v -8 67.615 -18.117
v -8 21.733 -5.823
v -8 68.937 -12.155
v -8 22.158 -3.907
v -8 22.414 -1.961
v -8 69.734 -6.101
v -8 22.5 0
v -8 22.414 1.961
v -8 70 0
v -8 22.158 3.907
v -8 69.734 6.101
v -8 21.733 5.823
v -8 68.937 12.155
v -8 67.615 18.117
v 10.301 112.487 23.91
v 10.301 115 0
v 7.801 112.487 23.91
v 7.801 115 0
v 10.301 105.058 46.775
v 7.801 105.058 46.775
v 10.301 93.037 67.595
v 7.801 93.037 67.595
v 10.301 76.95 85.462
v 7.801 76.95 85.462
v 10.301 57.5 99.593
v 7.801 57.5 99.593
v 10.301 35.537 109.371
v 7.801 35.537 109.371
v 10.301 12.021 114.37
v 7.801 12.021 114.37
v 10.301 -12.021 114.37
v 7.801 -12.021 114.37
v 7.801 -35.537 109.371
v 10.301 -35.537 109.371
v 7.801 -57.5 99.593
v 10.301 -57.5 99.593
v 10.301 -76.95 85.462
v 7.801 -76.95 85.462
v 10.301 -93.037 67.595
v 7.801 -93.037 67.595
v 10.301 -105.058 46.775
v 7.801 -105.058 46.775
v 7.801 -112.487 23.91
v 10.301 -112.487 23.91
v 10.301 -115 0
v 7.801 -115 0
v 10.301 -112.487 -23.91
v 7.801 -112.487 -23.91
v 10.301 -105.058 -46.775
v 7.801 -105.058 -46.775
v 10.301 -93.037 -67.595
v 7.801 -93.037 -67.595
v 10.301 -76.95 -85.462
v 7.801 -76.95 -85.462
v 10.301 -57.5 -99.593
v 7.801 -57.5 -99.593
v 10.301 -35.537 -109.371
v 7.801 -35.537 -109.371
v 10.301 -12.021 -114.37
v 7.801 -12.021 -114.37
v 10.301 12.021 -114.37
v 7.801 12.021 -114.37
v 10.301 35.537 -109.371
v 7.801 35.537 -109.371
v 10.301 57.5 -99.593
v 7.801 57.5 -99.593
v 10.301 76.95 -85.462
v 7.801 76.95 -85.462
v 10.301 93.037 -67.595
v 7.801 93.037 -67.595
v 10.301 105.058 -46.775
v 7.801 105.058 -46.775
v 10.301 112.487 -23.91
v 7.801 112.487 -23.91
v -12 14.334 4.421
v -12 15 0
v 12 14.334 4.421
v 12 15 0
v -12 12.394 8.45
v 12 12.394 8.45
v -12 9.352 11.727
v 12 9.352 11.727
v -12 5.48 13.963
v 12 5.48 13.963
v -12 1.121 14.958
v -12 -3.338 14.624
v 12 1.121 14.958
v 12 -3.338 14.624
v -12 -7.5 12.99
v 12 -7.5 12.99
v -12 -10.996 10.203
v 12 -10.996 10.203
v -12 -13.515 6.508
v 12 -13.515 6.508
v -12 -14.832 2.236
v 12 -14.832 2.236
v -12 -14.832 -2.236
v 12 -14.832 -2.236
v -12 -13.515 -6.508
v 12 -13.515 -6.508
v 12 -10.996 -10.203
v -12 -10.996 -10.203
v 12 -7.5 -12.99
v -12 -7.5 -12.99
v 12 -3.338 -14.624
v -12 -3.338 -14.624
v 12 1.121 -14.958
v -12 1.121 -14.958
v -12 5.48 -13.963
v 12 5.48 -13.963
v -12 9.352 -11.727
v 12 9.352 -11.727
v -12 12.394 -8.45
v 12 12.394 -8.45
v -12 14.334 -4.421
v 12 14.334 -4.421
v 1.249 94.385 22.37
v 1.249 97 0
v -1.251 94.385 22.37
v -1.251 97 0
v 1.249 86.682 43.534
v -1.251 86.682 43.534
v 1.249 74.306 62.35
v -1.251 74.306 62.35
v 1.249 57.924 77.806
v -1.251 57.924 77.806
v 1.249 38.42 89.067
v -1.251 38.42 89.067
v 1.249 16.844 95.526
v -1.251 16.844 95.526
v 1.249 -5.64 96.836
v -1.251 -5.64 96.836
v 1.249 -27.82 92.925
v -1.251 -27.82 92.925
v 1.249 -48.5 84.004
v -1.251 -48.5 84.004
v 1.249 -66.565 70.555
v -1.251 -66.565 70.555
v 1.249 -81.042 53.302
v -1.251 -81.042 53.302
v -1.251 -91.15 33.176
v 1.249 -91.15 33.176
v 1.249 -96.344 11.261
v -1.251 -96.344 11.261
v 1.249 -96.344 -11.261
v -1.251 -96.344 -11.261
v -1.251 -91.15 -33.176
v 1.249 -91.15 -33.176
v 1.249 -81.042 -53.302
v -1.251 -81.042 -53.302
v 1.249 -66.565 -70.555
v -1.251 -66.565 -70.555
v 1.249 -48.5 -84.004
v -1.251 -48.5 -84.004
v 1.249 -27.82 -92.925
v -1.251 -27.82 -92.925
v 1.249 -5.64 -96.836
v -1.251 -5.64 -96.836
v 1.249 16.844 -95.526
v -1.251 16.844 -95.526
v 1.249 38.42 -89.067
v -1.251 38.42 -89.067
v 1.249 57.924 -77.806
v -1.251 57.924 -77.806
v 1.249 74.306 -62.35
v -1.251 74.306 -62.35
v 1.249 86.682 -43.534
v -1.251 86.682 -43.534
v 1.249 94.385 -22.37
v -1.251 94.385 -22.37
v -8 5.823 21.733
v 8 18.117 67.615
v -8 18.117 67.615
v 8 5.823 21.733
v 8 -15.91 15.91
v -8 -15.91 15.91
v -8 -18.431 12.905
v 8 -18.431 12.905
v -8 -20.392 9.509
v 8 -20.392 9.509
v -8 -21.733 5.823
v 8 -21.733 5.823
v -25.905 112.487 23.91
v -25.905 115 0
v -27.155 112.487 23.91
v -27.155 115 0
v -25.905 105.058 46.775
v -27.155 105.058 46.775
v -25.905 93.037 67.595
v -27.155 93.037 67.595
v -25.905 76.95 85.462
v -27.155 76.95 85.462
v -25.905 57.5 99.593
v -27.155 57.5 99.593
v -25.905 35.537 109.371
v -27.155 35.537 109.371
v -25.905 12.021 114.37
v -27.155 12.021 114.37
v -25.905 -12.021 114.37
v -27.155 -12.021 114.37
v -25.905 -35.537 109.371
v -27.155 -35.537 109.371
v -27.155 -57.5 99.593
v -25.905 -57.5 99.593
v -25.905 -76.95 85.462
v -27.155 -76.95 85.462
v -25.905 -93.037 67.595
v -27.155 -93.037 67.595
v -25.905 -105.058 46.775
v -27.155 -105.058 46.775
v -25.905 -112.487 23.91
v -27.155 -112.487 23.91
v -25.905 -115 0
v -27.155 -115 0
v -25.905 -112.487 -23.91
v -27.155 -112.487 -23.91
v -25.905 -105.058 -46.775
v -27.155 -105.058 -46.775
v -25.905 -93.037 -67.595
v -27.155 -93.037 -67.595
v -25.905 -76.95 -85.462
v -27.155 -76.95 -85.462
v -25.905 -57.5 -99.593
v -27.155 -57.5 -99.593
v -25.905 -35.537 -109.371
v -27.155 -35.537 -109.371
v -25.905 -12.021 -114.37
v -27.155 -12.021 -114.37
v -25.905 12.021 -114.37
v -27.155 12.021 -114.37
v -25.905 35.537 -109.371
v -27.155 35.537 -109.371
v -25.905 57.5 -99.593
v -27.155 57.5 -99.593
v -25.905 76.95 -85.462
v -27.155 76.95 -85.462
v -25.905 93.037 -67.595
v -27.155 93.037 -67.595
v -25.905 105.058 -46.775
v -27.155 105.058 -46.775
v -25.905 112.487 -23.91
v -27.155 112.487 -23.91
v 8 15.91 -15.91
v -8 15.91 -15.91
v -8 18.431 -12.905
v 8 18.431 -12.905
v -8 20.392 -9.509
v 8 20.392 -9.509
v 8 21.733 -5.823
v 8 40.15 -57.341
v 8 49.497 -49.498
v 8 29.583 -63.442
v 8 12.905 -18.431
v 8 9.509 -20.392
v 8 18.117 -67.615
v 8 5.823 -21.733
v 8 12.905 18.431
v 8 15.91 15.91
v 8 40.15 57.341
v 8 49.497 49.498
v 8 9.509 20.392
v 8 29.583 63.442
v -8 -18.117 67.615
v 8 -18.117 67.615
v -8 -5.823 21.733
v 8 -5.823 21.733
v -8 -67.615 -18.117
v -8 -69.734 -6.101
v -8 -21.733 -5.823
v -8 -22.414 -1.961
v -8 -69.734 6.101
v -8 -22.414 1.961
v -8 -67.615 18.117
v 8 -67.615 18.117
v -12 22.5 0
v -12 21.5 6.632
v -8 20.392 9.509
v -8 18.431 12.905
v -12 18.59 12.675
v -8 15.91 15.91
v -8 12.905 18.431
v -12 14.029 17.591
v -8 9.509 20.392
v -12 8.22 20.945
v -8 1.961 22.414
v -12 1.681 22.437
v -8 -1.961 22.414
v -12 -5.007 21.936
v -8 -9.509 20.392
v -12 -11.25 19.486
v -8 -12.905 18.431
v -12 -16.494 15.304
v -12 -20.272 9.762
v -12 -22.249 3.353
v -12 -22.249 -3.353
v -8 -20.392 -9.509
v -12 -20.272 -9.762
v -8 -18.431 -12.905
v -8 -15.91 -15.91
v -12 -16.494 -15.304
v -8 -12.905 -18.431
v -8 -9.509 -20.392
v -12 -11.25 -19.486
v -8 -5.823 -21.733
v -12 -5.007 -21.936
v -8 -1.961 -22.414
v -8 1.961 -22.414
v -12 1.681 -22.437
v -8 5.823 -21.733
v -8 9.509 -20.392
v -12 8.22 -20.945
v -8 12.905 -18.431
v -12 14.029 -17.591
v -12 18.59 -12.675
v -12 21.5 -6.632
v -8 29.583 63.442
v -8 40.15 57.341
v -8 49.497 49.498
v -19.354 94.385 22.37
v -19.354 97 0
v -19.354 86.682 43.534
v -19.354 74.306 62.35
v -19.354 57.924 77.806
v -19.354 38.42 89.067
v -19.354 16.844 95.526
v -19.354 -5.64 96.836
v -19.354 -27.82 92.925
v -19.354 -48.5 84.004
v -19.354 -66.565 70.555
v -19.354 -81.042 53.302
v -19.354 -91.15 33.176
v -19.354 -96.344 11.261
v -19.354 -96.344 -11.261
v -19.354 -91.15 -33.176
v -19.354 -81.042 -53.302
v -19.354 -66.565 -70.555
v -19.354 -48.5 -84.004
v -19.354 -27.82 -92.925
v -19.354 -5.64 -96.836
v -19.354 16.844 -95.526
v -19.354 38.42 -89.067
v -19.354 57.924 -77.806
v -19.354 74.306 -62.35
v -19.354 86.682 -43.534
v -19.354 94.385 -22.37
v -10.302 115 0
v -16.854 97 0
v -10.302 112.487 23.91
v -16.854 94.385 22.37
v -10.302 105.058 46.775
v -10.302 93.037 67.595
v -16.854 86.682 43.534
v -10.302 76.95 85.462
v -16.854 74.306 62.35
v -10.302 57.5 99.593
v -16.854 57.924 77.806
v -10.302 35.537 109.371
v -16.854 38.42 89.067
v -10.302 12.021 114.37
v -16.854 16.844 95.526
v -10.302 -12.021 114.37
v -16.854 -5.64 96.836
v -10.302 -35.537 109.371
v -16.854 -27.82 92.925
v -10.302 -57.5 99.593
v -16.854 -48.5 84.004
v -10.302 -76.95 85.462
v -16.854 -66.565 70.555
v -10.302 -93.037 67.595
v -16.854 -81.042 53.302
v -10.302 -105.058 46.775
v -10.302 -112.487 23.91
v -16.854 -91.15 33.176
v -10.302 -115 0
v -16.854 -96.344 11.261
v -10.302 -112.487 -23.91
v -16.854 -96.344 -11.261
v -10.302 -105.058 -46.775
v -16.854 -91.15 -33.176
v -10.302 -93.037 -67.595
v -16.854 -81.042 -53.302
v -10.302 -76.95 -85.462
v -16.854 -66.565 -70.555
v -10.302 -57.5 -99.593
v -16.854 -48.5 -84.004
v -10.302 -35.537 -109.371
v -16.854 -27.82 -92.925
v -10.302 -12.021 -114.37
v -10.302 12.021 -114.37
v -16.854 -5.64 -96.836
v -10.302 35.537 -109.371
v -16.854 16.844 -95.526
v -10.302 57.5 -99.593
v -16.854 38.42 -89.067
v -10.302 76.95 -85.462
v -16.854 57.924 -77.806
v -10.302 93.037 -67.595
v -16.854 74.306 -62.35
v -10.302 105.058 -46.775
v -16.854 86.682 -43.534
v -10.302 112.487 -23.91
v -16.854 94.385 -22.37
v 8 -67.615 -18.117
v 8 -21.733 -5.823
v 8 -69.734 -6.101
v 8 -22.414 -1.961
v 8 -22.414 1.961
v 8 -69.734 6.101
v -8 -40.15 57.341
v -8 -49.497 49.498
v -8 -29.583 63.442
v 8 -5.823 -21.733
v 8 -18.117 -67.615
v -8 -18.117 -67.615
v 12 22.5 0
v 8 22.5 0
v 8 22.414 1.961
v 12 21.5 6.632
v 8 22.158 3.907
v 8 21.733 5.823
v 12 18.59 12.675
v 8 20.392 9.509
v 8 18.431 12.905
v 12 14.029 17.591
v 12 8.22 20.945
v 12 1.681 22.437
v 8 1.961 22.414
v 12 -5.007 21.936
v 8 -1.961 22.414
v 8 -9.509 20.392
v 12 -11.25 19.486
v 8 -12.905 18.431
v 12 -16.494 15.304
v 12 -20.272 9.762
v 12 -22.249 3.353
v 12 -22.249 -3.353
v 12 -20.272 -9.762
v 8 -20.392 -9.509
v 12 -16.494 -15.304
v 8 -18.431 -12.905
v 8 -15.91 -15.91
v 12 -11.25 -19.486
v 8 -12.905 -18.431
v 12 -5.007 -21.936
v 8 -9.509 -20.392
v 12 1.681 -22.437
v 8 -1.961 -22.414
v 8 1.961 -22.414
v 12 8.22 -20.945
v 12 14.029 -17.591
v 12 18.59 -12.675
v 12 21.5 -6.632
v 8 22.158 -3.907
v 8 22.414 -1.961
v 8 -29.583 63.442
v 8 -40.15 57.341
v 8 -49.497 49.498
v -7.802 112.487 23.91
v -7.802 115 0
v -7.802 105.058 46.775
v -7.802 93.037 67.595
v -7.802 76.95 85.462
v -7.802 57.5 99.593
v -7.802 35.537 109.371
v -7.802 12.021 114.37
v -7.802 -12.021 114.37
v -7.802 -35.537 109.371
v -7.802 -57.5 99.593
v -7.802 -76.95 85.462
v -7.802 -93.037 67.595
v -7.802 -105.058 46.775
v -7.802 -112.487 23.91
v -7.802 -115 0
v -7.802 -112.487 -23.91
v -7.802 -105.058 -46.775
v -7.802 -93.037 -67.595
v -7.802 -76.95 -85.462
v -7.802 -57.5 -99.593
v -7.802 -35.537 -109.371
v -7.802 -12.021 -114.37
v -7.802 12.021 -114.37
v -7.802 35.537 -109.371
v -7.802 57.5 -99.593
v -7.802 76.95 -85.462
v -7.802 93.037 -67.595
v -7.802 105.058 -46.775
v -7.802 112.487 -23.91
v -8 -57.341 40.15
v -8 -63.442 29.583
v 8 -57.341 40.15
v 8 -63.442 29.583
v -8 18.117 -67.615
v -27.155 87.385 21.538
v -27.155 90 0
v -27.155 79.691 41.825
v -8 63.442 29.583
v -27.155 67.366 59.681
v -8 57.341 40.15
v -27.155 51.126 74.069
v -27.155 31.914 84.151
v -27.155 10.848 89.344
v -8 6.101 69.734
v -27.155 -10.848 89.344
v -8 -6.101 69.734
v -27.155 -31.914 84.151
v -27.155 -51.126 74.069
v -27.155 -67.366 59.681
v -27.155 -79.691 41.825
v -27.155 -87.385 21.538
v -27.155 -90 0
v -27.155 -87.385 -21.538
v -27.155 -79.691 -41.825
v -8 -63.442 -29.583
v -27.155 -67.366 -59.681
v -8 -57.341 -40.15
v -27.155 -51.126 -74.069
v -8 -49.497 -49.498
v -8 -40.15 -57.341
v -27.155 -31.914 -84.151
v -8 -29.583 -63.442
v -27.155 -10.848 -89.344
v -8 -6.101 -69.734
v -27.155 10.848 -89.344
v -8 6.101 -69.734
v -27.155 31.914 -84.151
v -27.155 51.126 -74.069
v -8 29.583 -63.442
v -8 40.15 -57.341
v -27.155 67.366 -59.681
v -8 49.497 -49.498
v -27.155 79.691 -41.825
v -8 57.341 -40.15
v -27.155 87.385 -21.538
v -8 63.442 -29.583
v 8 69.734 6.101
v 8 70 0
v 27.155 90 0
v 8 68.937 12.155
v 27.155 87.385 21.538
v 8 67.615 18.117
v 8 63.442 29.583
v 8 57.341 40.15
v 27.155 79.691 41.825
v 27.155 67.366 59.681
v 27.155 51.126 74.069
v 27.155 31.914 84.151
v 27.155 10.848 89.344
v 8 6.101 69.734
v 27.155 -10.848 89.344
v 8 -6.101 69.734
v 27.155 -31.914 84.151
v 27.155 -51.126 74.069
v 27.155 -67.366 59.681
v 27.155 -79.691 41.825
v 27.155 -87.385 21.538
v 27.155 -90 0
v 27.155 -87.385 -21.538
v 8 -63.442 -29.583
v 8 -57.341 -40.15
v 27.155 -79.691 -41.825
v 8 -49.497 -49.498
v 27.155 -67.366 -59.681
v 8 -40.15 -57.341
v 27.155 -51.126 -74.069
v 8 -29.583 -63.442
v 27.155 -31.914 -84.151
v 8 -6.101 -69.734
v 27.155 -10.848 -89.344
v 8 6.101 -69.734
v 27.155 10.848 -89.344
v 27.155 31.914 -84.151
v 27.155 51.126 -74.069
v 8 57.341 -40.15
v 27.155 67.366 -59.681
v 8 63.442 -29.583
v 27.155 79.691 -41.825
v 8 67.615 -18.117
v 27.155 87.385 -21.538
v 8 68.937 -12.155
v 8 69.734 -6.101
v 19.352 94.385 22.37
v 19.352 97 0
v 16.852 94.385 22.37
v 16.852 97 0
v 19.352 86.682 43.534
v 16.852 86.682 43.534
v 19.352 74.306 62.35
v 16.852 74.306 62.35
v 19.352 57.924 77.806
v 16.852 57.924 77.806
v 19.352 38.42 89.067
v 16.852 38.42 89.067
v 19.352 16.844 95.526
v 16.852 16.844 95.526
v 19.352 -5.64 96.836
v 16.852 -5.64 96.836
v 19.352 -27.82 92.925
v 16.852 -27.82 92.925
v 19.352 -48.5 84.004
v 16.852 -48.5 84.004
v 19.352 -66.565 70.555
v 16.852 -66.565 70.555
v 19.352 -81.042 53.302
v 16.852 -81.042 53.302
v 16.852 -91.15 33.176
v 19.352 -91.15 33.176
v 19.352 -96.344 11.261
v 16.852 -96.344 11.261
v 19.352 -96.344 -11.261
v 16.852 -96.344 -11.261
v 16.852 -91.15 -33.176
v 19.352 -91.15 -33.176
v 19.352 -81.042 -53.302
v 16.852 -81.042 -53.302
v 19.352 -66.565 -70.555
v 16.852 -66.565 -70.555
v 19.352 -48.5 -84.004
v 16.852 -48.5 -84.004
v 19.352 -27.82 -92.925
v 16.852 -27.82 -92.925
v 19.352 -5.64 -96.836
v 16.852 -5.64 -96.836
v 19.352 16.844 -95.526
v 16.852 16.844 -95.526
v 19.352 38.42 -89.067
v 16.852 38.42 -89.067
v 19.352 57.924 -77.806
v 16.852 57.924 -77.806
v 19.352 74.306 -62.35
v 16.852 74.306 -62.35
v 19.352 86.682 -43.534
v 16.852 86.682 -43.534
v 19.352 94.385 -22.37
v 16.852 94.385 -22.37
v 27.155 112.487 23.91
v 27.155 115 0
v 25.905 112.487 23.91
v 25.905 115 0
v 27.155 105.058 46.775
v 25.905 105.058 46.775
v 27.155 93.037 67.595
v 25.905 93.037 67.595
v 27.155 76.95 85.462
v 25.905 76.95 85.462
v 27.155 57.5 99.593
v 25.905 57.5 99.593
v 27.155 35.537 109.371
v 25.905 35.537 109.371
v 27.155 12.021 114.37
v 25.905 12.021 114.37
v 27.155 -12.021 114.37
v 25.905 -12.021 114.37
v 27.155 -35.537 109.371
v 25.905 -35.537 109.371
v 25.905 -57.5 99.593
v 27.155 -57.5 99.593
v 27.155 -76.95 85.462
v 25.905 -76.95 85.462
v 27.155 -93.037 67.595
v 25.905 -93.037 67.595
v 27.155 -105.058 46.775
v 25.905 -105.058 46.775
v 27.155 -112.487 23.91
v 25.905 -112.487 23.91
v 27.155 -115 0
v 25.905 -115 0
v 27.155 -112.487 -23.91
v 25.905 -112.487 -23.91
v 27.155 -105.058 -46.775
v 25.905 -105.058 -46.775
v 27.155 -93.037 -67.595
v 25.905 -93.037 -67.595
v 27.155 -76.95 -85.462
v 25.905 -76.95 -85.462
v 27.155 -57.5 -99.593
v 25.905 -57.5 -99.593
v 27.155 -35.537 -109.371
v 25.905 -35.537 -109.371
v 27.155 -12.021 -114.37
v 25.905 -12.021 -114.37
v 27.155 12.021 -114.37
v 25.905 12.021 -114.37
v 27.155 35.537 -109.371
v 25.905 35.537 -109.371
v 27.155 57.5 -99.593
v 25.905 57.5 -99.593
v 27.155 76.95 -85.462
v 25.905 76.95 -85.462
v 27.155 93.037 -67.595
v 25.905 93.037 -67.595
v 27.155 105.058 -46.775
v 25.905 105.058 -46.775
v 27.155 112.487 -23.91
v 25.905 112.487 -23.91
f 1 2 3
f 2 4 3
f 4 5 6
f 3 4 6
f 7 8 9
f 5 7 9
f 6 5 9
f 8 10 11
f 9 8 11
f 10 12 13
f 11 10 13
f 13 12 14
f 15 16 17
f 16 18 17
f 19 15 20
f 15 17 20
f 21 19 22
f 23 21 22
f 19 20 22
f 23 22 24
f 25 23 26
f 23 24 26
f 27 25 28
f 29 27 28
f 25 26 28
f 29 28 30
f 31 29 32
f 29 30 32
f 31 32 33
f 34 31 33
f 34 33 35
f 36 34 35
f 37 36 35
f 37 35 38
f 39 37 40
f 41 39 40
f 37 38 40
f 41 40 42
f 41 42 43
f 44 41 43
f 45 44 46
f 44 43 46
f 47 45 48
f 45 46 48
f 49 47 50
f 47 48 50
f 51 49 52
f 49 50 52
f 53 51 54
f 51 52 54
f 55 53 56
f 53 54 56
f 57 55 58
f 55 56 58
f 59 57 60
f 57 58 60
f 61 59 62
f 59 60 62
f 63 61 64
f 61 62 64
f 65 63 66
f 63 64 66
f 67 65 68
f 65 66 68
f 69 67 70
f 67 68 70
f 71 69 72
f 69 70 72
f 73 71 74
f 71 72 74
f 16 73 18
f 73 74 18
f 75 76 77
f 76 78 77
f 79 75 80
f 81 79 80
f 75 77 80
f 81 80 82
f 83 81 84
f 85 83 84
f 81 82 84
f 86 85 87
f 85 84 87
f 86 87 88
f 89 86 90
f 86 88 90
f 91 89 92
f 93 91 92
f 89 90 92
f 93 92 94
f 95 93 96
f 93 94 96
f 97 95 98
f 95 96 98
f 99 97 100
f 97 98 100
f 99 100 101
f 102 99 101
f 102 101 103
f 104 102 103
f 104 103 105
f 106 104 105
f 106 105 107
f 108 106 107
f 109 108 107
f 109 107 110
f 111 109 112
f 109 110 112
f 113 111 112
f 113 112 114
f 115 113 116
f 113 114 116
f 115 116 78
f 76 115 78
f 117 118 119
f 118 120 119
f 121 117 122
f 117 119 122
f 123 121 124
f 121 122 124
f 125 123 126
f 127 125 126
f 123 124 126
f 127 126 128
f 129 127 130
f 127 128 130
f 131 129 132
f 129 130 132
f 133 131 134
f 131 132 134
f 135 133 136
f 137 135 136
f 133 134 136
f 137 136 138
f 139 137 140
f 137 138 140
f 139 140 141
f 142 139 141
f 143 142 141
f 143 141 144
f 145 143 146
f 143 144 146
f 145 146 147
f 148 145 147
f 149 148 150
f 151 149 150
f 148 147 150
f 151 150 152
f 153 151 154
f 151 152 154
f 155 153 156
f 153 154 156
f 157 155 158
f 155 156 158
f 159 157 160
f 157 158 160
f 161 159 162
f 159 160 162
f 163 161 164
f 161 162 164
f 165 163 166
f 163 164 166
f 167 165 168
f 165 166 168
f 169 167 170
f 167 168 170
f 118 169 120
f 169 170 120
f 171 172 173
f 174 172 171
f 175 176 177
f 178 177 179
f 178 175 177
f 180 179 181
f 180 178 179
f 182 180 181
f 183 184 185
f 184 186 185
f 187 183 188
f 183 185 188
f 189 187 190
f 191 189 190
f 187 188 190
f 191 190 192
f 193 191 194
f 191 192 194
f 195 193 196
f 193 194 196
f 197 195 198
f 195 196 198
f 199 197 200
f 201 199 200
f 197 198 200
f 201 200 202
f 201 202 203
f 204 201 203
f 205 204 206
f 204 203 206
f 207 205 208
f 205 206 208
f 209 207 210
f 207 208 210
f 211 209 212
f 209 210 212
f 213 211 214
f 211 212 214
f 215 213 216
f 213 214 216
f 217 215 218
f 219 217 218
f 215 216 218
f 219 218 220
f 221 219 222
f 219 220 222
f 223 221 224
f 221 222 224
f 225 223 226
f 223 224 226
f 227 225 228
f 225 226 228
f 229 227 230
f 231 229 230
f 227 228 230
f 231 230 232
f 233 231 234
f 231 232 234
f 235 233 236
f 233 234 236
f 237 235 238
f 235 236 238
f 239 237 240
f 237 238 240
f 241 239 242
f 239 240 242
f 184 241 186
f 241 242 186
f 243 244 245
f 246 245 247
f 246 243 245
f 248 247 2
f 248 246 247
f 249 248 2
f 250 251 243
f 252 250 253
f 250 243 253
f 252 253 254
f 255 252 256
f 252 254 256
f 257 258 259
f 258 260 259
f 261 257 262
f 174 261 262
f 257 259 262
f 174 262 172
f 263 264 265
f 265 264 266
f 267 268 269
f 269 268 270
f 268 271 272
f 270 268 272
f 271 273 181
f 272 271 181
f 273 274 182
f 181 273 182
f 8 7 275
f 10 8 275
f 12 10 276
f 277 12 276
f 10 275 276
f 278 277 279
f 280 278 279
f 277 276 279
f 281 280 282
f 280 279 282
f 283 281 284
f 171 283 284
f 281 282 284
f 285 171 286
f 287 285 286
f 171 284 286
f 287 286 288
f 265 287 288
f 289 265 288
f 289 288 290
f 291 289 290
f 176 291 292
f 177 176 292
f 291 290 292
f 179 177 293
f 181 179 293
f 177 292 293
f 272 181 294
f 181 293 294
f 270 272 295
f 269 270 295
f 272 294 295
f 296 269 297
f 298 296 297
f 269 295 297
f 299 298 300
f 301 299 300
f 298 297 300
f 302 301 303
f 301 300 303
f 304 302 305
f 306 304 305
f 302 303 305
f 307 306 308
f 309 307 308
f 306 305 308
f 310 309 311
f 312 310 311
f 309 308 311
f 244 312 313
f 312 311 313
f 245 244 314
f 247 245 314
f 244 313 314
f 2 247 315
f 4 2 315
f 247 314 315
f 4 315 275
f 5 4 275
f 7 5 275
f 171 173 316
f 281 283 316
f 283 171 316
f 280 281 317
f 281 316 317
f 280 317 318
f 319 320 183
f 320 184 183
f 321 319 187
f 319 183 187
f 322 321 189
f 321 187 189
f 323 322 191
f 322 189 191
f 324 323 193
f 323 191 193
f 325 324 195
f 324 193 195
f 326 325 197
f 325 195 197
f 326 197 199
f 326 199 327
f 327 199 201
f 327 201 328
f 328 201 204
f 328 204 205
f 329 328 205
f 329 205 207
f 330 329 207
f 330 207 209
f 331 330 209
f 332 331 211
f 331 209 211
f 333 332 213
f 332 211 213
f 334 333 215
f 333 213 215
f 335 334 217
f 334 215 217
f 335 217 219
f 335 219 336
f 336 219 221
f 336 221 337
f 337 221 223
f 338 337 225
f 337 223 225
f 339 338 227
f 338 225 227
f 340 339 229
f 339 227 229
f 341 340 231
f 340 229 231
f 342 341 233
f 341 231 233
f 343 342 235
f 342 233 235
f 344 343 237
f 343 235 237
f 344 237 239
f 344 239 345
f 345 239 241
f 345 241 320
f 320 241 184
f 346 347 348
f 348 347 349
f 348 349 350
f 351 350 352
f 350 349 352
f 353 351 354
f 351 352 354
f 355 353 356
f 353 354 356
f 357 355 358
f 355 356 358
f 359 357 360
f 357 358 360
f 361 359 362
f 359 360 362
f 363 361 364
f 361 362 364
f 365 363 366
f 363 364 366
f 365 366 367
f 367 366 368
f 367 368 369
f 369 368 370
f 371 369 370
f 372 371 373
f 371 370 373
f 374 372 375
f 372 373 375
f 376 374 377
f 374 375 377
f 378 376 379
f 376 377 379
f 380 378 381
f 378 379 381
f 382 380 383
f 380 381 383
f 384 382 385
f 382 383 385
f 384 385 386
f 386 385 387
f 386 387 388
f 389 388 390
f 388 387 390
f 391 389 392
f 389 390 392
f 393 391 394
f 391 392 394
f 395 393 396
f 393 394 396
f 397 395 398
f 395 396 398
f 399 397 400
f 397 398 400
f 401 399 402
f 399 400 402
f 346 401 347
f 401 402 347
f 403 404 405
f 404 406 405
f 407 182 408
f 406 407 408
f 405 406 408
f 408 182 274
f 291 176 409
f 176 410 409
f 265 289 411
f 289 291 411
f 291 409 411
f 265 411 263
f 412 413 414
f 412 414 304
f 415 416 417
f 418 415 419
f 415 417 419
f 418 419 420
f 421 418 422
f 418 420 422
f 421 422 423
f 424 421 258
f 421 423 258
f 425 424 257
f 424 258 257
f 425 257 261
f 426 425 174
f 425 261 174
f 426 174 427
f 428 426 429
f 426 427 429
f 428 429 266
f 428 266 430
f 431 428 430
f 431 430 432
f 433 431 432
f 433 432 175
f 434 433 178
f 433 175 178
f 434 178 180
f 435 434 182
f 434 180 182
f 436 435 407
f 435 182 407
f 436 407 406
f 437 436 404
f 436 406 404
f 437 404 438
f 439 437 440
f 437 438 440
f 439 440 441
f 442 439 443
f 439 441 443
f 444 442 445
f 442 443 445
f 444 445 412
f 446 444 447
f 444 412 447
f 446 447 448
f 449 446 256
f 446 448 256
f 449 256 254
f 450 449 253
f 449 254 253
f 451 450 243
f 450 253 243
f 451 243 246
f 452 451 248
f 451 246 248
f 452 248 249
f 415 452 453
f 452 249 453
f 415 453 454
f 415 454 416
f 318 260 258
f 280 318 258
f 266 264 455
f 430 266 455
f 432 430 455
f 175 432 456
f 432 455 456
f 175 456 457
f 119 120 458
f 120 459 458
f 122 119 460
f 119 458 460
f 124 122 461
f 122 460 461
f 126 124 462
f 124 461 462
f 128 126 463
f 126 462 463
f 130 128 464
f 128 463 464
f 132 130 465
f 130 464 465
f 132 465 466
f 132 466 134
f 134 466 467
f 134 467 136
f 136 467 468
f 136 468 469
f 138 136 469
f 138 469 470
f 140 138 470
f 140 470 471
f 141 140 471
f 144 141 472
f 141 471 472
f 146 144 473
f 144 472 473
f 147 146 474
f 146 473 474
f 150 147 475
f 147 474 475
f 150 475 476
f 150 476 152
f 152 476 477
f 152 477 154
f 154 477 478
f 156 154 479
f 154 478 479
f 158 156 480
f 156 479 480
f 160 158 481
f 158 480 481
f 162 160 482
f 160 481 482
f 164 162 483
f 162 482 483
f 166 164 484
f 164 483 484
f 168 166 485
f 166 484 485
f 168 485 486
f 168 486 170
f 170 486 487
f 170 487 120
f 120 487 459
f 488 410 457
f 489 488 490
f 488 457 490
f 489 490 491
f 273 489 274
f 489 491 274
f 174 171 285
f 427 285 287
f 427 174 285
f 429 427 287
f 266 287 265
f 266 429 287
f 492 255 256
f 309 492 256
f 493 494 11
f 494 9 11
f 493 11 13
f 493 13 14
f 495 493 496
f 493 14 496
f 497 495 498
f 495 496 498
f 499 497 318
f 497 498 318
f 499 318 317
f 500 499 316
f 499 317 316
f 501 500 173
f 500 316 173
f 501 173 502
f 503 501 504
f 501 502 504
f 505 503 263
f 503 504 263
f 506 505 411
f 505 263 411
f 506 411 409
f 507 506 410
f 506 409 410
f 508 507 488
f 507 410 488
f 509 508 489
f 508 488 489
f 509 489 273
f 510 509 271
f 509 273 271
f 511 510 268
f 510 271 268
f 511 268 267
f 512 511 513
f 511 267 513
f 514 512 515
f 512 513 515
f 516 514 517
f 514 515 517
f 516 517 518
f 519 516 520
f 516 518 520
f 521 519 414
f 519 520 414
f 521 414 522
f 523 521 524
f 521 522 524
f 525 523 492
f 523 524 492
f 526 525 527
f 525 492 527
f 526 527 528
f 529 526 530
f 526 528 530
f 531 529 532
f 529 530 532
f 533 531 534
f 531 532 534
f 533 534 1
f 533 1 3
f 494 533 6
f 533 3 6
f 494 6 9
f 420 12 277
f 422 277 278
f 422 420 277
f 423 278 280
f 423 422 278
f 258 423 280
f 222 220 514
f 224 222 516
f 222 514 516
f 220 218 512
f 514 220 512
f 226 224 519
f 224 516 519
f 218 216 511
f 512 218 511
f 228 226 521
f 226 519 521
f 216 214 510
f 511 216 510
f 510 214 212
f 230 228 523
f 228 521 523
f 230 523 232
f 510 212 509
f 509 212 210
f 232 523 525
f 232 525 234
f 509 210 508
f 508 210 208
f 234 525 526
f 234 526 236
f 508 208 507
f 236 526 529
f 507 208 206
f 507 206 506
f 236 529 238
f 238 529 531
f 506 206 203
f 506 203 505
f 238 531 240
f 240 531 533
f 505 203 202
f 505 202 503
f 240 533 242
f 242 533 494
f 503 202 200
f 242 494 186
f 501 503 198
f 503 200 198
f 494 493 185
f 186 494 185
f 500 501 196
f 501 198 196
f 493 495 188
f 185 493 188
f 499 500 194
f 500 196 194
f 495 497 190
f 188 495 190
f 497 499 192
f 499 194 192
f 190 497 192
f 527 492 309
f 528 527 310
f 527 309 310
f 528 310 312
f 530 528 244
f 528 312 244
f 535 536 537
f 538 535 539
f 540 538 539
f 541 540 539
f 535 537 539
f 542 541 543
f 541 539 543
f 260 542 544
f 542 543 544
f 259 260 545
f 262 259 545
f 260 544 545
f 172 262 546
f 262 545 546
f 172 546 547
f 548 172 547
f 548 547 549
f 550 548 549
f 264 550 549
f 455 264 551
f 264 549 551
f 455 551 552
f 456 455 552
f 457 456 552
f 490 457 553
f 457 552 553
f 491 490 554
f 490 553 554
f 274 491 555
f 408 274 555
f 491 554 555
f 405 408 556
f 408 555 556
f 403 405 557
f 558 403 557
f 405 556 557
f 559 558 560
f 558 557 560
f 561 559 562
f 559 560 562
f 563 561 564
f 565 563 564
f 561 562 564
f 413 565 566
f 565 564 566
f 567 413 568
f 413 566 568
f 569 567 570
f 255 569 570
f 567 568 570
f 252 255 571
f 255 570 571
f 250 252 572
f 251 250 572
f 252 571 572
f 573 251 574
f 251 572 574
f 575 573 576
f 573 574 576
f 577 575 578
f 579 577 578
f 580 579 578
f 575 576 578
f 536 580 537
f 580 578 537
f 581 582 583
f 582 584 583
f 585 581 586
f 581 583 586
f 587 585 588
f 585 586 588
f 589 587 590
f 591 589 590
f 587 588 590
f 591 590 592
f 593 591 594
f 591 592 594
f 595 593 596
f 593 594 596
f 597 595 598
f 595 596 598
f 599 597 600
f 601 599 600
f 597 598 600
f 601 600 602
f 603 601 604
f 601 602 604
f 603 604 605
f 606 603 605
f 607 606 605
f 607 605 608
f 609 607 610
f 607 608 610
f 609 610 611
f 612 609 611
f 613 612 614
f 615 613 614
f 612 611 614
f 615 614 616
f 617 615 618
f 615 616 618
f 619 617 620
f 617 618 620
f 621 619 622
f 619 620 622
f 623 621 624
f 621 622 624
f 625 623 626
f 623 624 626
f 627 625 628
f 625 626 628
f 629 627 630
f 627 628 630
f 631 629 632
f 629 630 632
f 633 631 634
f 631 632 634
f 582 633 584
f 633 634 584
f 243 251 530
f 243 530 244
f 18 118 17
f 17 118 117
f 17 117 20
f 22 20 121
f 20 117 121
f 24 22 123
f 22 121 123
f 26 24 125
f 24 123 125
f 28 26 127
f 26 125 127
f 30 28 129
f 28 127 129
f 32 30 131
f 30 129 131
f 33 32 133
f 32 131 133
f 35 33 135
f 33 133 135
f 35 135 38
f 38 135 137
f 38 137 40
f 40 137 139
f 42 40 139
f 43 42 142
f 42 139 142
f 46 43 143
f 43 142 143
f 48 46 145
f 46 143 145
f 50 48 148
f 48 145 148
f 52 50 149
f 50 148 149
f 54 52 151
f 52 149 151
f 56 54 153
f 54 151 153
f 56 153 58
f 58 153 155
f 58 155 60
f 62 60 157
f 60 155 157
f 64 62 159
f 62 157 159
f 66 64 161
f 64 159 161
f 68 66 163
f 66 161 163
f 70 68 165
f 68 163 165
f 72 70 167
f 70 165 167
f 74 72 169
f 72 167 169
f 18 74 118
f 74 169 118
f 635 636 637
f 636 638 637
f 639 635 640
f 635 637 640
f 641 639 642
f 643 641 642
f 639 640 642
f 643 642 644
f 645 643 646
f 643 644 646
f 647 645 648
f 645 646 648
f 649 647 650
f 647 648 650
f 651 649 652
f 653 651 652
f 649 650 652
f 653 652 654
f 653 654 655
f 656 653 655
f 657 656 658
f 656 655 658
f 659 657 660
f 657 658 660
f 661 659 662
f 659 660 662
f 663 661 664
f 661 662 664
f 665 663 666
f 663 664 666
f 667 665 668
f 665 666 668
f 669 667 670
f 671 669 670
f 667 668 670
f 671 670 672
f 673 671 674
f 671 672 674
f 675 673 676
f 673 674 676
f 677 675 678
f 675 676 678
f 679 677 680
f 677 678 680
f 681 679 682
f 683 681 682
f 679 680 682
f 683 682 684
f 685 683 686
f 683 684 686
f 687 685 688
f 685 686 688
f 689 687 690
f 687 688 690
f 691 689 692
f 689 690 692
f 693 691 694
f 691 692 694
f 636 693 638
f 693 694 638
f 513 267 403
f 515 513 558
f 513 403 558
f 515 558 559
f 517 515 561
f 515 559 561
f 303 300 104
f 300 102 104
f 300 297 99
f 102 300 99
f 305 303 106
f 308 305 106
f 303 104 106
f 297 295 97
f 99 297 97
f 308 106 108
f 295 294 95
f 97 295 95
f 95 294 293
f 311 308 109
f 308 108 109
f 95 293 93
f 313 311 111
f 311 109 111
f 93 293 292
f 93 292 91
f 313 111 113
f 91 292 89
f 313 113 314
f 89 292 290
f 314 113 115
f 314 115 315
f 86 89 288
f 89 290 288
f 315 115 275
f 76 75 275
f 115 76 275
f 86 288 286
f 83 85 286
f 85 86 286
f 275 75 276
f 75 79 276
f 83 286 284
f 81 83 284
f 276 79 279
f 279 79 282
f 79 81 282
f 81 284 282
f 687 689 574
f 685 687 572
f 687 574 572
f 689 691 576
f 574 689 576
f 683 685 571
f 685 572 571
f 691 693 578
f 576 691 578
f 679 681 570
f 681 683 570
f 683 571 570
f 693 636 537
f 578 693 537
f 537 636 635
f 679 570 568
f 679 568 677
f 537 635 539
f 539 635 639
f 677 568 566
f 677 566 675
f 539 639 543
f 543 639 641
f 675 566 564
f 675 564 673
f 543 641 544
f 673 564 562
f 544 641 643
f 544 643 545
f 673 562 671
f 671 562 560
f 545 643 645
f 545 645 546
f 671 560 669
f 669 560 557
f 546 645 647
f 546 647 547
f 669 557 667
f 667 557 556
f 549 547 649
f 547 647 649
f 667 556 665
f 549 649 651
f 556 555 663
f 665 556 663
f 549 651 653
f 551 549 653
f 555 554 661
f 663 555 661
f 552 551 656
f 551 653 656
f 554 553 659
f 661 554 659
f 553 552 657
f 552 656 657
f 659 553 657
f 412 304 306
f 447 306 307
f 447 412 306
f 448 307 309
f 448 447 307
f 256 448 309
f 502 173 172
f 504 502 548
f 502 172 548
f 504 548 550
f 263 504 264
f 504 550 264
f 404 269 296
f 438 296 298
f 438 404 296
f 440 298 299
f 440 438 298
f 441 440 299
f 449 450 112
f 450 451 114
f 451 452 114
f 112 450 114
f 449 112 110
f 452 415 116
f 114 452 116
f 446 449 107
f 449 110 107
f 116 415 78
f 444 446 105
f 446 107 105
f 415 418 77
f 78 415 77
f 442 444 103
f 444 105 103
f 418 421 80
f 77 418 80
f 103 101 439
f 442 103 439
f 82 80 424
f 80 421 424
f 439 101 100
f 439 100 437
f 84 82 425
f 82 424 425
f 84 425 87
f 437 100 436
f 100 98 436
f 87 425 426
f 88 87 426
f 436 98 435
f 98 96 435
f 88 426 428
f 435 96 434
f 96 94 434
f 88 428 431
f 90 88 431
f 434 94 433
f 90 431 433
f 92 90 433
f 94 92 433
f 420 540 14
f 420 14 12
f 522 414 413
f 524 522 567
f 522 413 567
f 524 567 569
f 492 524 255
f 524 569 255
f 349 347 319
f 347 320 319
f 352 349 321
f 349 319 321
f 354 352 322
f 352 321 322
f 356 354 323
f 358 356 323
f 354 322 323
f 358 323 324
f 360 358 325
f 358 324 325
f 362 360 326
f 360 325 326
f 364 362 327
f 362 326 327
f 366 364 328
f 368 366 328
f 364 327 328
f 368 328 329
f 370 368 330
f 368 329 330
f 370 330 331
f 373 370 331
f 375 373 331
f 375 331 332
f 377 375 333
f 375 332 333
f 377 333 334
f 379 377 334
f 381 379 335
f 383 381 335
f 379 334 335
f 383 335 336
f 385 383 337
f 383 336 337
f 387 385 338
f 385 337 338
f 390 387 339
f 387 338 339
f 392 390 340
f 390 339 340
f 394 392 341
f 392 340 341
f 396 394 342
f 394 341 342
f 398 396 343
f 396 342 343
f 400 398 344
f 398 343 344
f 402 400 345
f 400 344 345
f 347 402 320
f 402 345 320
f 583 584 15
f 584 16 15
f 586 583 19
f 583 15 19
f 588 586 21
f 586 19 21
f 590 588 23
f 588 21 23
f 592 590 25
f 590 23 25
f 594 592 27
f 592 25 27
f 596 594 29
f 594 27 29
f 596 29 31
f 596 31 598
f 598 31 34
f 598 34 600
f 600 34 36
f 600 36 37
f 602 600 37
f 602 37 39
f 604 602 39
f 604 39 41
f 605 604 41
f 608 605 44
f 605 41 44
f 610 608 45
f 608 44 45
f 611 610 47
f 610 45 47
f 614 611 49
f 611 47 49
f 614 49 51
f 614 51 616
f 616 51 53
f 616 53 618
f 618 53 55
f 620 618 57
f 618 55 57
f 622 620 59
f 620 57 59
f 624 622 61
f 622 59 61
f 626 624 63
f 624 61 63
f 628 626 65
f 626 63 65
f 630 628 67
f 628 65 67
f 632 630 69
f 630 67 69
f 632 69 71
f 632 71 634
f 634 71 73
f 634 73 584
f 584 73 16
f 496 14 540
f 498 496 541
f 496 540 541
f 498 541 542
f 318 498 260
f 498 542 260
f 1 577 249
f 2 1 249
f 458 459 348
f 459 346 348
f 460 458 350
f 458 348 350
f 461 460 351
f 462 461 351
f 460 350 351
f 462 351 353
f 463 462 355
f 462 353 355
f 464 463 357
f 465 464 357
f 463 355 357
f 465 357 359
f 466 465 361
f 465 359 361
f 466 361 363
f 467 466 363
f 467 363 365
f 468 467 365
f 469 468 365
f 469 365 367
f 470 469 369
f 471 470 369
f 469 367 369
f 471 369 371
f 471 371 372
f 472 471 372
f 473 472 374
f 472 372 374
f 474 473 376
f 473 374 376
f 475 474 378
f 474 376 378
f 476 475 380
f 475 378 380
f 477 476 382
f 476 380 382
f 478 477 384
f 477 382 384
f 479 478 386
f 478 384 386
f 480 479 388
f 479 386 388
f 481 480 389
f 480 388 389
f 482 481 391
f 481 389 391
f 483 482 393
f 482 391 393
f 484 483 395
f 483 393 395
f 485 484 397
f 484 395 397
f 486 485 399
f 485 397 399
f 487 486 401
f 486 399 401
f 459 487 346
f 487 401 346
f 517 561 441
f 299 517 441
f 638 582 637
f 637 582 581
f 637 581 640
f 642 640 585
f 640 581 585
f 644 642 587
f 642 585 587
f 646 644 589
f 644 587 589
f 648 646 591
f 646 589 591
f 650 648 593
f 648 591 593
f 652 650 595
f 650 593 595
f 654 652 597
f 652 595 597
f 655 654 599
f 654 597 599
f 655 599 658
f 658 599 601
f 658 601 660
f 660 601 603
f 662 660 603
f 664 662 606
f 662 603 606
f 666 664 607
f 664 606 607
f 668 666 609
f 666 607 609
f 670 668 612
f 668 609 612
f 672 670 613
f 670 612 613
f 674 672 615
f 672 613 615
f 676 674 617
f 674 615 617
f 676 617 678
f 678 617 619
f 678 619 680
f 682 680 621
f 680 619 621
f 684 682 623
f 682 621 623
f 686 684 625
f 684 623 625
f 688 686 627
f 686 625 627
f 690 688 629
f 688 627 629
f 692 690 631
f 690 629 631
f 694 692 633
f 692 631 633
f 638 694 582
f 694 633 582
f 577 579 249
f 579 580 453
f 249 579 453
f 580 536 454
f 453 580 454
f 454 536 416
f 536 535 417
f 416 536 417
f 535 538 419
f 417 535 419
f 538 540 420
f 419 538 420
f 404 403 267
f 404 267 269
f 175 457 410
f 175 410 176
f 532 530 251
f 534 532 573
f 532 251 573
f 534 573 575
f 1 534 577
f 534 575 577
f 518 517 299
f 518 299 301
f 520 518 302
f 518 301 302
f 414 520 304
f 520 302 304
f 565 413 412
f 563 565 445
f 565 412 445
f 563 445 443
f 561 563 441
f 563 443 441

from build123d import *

# Parameters (mm, degrees)
POCKET_DEPTH       = 16
POLARPATTERN_COUNT = 6


with BuildPart() as part:
    # Sketch → Revolution (revolve)
    with BuildSketch(Plane.XY):
        Polygon((-12, 15), (12, 15), (12, 22.5), (8, 22.5), (8, 70), (27.155, 90), (27.155, 115), (25.905, 115), (19.352321, 97), (16.852321, 97), (10.300857, 115), (7.800857, 115), (1.249393, 97), (-1.250607, 97), (-7.802072, 115), (-10.302072, 115), (-16.853536, 97), (-19.353536, 97), (-25.905, 115), (-27.155, 115), (-27.155, 90), (-8, 70), (-8, 22.5), (-12, 22.5), align=None)
    revolve(axis=Axis((0, 0, 0), (1, 0, 0)))

    # Sketch001 (on Face7 of Revolution) → Pocket (cut)
    with BuildSketch(Plane.YZ.offset(8)):
        with BuildLine():
            ThreePointArc((5.823465, 21.733321), (0, 22.5), (-5.823465, 21.733321))
            Line((-18.11737, 67.614798), (-5.823465, 21.733321))
            ThreePointArc((18.11737, 67.614798), (0, 70), (-18.11737, 67.614798))
            Line((18.11737, 67.614798), (5.823465, 21.733321))
        make_face()
    pocket = extrude(amount=-POCKET_DEPTH, mode=Mode.SUBTRACT)

    # PolarPattern: Pocket ×6 about axis
    polarpattern_axis = Axis((8, 0, 0), (1, 0, 0))
    for i in range(1, POLARPATTERN_COUNT):
        add(pocket.rotate(polarpattern_axis, i * 360 / POLARPATTERN_COUNT), mode=Mode.SUBTRACT)


solid = part.part
